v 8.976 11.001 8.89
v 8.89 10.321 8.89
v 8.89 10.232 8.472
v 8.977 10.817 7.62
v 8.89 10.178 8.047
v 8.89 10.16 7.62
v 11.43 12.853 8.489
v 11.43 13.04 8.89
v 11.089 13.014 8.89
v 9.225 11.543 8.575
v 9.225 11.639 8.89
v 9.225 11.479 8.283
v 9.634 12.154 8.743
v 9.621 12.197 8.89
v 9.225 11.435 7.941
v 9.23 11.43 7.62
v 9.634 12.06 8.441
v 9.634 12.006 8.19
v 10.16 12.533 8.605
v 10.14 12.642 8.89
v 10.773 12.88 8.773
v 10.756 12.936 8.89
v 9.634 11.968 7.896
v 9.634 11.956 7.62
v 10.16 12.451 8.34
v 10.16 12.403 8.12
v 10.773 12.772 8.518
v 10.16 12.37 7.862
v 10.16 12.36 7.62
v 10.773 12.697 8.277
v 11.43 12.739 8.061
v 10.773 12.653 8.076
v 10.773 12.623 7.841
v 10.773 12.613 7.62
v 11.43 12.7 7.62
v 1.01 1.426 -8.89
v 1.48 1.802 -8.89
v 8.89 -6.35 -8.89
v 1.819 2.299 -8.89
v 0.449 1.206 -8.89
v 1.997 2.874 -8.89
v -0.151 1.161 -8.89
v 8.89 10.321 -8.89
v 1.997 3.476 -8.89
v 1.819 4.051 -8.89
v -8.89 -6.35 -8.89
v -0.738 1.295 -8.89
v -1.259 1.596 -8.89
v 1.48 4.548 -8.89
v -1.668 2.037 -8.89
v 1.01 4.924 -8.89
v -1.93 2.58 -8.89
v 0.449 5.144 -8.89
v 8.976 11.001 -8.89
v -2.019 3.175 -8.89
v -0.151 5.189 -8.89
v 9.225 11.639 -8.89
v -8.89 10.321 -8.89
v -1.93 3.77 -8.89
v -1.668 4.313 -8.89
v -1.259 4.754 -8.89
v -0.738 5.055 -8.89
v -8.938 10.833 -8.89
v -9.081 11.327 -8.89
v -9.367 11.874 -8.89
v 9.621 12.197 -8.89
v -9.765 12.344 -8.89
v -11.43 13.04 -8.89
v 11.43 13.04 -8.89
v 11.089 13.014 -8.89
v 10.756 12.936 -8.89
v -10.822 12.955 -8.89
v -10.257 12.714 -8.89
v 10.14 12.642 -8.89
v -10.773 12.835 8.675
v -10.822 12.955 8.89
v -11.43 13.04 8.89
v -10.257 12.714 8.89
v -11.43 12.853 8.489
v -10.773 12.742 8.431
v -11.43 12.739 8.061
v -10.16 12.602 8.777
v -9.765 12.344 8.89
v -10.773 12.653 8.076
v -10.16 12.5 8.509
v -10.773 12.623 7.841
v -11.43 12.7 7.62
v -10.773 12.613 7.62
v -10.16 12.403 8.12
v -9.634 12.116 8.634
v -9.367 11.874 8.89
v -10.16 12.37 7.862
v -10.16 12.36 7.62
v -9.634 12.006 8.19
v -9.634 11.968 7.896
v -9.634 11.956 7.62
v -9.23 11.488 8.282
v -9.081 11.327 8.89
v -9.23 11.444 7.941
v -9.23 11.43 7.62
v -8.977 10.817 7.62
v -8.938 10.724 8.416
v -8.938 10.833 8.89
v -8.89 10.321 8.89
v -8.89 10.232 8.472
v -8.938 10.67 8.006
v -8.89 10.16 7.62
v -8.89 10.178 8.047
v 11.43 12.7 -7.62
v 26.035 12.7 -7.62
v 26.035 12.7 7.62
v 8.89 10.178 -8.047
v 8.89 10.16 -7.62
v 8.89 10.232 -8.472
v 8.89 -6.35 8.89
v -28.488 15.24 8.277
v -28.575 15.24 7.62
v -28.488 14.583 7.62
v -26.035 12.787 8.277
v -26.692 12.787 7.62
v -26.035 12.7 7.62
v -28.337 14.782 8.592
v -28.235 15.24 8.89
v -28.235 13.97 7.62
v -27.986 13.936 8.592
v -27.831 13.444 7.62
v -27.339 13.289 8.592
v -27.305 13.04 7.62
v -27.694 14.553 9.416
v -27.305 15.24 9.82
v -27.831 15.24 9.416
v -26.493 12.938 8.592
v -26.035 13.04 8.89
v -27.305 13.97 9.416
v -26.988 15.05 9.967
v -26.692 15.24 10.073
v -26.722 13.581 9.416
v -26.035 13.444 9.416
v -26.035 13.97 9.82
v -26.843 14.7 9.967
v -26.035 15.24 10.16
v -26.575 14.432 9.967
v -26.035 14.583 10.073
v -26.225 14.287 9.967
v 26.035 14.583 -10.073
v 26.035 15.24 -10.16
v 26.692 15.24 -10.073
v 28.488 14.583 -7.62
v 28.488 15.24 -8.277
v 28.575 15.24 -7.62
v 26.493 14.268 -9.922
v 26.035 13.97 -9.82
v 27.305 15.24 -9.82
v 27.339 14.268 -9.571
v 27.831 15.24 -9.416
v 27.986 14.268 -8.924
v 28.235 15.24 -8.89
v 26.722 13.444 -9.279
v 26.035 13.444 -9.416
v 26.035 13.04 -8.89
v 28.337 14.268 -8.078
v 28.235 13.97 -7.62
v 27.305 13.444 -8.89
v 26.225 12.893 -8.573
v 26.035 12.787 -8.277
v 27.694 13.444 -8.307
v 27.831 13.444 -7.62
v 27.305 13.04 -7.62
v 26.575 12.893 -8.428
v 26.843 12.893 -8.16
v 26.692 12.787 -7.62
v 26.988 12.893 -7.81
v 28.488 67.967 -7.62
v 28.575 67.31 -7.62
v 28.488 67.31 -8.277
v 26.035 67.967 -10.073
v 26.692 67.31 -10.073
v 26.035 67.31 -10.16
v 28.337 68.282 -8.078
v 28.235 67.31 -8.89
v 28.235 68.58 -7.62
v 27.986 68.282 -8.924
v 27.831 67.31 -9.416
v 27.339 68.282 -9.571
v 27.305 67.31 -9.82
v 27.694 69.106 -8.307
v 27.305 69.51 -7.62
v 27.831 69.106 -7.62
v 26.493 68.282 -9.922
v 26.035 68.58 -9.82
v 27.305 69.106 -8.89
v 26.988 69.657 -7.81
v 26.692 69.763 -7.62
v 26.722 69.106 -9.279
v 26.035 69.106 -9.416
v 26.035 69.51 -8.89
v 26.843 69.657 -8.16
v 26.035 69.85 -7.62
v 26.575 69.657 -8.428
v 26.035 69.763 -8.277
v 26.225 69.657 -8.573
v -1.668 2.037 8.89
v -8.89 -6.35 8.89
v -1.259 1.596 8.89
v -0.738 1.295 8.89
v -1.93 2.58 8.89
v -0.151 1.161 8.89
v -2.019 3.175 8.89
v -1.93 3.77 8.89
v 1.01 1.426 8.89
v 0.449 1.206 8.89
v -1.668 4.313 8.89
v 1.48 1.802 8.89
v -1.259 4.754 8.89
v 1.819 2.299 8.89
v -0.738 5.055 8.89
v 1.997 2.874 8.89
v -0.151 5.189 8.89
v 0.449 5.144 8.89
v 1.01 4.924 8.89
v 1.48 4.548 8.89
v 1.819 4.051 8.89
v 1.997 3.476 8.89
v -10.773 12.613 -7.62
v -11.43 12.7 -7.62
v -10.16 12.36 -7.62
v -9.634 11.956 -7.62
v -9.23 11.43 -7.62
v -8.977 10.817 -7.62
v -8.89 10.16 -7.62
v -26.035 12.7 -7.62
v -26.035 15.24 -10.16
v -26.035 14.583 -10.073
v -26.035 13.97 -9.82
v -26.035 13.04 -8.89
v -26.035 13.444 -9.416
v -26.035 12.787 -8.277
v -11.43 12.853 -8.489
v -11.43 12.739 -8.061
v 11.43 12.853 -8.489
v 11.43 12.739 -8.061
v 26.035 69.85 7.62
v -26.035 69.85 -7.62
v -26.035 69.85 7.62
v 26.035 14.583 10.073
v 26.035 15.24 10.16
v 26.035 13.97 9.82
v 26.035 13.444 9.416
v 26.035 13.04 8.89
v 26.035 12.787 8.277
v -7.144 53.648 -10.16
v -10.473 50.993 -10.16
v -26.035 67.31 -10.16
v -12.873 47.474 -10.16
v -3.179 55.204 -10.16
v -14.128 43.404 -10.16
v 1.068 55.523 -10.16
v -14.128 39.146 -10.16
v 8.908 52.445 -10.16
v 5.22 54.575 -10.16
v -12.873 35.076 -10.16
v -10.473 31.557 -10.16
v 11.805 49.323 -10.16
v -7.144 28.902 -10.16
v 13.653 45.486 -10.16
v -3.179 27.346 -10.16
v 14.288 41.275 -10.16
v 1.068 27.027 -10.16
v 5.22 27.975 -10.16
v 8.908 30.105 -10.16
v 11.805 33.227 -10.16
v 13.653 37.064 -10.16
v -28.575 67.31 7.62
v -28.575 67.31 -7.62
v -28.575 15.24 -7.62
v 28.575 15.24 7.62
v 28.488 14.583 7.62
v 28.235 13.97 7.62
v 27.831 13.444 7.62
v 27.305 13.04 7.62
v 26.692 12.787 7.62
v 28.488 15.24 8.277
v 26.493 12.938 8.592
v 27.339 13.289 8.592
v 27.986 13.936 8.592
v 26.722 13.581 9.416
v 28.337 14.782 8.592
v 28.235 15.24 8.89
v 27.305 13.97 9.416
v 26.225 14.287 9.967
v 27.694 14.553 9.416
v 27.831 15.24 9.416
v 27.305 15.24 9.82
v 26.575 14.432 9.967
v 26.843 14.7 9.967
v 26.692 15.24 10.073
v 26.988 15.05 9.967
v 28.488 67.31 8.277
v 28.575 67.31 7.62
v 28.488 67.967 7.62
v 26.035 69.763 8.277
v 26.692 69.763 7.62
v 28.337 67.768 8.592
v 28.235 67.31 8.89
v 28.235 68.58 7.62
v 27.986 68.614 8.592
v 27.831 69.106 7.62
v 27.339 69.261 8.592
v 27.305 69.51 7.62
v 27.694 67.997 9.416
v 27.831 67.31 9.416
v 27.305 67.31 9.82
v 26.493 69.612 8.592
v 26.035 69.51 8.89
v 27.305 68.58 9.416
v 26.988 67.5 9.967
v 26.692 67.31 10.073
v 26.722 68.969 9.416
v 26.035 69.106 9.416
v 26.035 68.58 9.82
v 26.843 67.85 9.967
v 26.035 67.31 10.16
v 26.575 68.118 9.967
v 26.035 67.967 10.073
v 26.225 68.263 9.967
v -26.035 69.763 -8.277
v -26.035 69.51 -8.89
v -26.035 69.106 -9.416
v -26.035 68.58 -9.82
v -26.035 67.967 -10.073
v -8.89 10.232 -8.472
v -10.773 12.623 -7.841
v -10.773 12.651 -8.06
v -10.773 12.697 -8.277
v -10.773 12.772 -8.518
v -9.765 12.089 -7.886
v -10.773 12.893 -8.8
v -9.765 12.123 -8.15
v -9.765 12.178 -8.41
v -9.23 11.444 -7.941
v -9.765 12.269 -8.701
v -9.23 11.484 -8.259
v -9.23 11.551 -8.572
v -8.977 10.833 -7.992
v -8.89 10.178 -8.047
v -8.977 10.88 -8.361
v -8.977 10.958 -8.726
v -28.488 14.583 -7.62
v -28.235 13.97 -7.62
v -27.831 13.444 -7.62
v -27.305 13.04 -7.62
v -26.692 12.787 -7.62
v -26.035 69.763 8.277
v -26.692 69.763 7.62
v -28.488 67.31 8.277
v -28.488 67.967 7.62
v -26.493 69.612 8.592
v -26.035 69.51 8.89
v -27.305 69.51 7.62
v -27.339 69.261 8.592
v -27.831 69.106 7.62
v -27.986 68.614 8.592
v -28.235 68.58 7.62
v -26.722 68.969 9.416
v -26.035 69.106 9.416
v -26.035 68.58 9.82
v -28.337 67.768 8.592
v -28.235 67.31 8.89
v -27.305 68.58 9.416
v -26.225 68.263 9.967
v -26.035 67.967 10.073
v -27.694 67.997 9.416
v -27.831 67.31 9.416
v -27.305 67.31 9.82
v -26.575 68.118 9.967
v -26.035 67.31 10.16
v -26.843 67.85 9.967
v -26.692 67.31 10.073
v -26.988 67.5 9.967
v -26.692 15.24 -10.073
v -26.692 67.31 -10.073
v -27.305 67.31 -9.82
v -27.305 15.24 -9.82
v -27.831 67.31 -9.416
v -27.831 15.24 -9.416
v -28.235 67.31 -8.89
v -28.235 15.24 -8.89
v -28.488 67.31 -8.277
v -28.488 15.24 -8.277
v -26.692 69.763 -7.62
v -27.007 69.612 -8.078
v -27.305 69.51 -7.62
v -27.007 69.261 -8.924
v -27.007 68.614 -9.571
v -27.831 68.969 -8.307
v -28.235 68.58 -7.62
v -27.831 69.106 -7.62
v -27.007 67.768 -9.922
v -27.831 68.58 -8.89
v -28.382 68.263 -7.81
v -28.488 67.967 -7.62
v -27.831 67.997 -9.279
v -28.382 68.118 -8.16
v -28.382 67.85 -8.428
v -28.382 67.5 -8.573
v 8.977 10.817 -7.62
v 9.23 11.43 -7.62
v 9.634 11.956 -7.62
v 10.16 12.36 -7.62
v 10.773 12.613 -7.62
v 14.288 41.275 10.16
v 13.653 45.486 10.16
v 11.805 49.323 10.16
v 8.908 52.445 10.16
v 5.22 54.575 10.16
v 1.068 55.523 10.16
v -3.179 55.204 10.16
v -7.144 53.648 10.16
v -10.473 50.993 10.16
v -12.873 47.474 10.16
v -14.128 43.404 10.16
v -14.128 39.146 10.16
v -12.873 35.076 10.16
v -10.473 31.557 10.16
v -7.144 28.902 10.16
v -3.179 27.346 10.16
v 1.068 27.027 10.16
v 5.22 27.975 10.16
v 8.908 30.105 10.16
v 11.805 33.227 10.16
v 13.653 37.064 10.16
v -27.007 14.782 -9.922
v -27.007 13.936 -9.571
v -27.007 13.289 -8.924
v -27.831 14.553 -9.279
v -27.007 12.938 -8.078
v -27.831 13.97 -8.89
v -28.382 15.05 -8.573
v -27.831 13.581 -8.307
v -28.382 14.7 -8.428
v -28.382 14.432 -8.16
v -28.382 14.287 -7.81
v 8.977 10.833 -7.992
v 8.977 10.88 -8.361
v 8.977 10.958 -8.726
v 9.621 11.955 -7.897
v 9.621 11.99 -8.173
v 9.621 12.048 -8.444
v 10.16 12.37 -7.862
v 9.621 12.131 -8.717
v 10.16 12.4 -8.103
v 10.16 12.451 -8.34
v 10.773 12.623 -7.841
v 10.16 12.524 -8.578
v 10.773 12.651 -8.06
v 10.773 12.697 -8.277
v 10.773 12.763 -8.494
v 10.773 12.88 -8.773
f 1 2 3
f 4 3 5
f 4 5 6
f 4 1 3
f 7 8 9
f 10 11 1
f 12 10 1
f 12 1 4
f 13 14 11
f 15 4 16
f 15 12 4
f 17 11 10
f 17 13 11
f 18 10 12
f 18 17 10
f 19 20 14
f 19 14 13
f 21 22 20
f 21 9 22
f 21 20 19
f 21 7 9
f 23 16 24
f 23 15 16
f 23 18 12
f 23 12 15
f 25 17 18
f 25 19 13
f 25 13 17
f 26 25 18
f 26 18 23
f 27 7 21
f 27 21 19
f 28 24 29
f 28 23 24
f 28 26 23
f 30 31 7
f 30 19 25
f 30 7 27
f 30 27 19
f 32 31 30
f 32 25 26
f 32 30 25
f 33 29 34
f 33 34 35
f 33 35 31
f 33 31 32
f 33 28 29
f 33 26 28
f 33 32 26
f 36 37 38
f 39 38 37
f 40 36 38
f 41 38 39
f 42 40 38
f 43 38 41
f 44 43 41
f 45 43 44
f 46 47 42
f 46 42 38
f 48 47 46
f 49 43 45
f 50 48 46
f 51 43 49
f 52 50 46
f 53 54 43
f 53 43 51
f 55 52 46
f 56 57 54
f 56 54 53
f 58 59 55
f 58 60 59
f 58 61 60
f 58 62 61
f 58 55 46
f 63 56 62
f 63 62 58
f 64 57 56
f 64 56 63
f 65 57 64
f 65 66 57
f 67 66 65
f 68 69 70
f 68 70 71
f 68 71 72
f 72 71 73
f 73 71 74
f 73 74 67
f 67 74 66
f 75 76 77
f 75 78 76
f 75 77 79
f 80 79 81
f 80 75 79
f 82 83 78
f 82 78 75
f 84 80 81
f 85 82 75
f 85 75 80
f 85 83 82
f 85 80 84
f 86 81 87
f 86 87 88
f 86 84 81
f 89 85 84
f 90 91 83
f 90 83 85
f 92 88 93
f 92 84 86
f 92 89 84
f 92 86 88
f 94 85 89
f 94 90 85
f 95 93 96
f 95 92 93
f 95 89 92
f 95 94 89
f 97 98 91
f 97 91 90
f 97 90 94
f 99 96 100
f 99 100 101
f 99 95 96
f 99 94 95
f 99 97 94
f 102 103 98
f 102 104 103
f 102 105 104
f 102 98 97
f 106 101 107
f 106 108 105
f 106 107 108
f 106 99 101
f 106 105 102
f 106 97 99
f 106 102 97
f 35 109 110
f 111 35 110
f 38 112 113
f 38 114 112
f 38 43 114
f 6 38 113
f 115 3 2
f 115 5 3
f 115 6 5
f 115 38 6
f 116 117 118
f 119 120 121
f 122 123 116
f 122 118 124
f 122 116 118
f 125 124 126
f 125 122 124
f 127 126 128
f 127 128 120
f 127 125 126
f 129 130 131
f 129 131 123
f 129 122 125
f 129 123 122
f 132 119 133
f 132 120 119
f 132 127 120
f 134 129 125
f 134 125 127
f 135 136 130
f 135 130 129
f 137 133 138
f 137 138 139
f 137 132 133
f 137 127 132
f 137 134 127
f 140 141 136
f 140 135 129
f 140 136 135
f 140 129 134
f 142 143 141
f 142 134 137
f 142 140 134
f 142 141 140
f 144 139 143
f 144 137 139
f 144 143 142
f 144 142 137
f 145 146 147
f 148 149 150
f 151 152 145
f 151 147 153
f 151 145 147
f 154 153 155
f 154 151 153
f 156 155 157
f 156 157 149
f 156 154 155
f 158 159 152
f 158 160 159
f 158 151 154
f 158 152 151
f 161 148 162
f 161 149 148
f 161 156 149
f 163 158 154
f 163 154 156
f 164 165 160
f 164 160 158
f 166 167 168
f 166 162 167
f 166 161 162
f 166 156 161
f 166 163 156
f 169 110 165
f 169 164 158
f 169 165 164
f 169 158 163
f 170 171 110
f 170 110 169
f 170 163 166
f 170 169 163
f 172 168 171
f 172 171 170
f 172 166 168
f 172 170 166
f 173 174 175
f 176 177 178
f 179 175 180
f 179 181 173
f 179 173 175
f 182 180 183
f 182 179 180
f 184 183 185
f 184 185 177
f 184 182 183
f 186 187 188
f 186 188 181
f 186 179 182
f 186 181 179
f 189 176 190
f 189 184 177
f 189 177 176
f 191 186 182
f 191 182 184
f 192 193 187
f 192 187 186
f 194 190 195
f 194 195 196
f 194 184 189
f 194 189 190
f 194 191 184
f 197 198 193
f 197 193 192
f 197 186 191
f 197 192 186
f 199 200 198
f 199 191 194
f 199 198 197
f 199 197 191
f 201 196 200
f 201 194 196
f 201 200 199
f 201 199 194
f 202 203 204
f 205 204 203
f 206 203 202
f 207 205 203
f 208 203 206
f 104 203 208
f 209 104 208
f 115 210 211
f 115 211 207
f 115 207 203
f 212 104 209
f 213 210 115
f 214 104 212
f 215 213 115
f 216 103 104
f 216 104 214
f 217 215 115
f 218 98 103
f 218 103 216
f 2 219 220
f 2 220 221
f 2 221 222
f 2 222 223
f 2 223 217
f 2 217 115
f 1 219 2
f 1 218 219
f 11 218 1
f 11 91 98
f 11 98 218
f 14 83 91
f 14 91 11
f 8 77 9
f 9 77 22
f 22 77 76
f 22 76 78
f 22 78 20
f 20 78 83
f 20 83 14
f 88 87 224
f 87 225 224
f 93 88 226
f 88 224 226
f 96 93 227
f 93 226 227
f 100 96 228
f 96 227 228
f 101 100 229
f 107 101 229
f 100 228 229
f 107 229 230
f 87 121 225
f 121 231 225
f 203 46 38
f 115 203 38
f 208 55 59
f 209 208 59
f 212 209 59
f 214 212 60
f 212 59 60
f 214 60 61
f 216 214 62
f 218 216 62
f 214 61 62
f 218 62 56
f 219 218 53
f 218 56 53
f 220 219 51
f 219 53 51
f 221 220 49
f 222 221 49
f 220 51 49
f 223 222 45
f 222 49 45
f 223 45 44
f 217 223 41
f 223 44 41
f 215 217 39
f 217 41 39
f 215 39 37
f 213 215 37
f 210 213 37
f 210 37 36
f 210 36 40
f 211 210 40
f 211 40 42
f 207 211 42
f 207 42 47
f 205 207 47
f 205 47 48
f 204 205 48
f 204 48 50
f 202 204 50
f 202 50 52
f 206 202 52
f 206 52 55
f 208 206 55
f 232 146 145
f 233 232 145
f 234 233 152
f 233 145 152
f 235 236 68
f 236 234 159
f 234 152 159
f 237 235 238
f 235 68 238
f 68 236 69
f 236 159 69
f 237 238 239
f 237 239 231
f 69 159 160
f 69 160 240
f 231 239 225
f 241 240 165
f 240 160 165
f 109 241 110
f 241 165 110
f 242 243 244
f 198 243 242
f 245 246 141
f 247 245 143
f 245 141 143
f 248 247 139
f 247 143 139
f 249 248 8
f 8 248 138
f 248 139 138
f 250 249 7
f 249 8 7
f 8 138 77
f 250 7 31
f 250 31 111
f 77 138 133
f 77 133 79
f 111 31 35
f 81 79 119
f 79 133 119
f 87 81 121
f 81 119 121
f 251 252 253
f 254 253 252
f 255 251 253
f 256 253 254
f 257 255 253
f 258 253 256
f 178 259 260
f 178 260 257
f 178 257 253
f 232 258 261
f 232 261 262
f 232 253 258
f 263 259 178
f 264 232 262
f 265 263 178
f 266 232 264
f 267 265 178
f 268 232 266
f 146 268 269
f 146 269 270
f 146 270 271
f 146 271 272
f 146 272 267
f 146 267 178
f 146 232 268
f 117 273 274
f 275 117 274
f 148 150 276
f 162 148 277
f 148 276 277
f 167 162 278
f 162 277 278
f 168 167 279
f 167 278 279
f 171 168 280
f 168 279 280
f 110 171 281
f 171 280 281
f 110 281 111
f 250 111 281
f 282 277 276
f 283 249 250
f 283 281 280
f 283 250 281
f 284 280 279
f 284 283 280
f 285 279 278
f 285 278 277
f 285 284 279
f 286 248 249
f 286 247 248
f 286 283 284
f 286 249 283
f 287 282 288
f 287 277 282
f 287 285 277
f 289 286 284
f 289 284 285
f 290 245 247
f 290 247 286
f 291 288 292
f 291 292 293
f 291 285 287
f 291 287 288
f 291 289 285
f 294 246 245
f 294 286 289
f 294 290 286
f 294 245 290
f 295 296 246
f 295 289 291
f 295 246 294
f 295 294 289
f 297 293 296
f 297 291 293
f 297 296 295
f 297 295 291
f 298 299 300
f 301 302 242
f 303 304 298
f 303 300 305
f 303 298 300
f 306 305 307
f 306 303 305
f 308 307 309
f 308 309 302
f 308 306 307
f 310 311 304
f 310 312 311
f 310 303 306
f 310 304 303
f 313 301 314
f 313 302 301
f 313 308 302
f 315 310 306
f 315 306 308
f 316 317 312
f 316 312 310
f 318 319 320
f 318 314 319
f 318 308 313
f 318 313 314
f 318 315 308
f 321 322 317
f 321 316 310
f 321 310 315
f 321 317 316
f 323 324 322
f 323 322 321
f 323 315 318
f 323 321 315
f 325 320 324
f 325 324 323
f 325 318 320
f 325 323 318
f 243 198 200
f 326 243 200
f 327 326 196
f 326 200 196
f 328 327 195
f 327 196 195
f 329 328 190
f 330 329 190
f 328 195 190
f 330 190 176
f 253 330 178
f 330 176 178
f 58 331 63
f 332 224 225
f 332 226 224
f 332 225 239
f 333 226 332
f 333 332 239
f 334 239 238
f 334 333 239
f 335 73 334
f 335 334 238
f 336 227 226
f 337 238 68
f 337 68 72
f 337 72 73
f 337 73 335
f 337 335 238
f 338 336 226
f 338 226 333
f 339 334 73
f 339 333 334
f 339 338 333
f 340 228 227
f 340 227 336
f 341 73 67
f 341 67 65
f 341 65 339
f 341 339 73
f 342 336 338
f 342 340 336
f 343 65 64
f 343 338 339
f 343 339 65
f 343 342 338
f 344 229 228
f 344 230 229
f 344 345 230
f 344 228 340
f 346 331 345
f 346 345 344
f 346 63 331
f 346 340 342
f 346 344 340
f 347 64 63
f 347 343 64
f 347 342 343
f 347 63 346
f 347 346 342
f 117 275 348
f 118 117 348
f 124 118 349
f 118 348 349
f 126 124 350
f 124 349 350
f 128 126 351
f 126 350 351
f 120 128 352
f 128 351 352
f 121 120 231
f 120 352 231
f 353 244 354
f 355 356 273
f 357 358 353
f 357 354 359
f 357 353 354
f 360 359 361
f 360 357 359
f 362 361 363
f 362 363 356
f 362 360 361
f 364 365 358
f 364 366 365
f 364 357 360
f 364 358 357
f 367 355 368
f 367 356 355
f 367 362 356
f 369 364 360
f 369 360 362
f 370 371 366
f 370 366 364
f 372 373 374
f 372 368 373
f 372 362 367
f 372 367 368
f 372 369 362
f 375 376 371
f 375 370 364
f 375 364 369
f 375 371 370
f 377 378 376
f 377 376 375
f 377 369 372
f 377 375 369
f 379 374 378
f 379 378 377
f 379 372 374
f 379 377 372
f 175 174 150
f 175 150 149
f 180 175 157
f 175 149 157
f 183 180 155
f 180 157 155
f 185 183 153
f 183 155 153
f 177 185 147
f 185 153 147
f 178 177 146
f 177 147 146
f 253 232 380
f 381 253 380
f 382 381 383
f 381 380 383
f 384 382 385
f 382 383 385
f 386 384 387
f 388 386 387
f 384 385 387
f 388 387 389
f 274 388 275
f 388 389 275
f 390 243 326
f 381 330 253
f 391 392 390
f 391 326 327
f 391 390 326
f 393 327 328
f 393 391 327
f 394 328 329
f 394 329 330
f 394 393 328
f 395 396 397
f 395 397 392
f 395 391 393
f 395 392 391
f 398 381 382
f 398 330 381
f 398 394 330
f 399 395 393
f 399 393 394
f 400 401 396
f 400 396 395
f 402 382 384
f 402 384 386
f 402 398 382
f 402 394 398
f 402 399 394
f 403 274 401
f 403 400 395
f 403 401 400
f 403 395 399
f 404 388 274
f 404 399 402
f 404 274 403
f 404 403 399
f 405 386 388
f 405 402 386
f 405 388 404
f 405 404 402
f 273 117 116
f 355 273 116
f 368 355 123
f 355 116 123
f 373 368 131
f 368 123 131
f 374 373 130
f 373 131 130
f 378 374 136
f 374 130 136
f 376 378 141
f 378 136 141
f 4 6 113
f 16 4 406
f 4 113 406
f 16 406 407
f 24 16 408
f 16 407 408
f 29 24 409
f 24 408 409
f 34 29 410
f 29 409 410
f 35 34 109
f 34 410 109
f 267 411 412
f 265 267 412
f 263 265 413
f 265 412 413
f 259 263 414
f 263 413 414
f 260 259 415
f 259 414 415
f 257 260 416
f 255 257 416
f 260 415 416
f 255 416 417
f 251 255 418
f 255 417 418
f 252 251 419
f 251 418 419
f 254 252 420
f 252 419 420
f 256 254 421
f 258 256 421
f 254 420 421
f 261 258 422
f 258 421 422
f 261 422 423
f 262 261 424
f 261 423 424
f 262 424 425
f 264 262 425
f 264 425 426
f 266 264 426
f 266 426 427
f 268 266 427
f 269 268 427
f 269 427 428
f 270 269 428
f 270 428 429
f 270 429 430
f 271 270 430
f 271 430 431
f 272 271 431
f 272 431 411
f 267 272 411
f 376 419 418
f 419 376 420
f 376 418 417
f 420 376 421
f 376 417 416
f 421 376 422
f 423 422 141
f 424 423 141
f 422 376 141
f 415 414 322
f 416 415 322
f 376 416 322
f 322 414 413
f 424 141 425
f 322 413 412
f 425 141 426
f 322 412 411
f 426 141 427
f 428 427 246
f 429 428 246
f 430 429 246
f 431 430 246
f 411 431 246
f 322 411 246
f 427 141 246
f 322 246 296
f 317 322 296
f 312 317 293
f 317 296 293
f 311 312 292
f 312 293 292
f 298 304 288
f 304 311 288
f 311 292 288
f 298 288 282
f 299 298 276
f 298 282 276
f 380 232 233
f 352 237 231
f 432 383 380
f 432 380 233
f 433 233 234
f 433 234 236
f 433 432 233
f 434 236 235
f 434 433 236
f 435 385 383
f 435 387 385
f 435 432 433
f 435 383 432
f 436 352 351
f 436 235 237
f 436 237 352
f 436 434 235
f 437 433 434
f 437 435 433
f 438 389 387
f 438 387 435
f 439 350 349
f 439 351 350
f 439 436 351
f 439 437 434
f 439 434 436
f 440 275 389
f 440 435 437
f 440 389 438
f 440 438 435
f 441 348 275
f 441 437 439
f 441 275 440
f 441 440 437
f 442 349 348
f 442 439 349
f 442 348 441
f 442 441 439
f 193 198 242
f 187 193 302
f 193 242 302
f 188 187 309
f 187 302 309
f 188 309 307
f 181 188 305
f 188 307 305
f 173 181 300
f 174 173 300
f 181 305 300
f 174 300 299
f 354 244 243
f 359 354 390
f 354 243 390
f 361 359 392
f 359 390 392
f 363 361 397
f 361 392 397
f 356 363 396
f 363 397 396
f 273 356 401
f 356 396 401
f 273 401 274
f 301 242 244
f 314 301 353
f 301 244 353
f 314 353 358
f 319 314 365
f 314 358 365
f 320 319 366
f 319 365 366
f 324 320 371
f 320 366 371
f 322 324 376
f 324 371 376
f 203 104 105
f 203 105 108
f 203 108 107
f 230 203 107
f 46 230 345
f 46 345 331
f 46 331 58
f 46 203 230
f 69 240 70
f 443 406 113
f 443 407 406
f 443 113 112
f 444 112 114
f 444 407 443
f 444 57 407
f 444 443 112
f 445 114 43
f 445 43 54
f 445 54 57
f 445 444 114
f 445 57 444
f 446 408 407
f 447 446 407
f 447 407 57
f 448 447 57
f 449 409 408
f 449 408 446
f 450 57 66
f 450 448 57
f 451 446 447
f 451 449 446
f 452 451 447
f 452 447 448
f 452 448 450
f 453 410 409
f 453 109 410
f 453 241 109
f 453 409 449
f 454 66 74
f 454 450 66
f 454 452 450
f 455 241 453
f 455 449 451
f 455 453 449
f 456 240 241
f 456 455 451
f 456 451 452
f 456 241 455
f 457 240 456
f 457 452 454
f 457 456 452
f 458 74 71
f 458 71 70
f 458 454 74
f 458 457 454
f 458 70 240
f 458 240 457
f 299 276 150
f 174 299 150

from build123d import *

# Parameters (mm, degrees)
BOSS_EXTRUDE1_DEPTH      = 12.7
BOSS_EXTRUDE1_DEPTH_BACK = 6.35
SKETCH1_W                = 17.78
SKETCH1_H                = 17.78
SKETCH2_W                = 57.15
SKETCH2_H                = 20.32
BOSS_EXTRUDE2_DEPTH      = 57.15
SKETCH3_R                = 14.2875
CUT_EXTRUDE1_DEPTH       = 79.156608966
FILLET1_R                = 2.54
SKETCH4_R                = 2.0193
CUT_EXTRUDE2_DEPTH       = 78.836081768
FILLET2_R                = 2.54


with BuildPart() as part:
    # Sketch1 → Boss-Extrude1 (new, two sides: drawn at the far end of the back side and taken through both)
    with BuildSketch(Plane(origin=(0, 0, 0), x_dir=(1, 0, 0), z_dir=(0, 1, 0)).offset(-BOSS_EXTRUDE1_DEPTH_BACK)):
        Rectangle(SKETCH1_W, SKETCH1_H)
    extrude(amount=BOSS_EXTRUDE1_DEPTH + BOSS_EXTRUDE1_DEPTH_BACK)

    # Sketch2 → Boss-Extrude2 (add)
    with BuildSketch(Plane(origin=(0, 12.7, 0), x_dir=(1, 0, 0), z_dir=(0, 1, 0))):
        Rectangle(SKETCH2_W, SKETCH2_H)
    extrude(amount=BOSS_EXTRUDE2_DEPTH)

    # Sketch3 → Cut-Extrude1 (cut, through all)
    with BuildSketch(Plane.XY.offset(10.16)):
        with Locations((0, 41.275)):
            Circle(SKETCH3_R)
    extrude(amount=-CUT_EXTRUDE1_DEPTH, mode=Mode.SUBTRACT)

    # Fillet1
    # the kernel refuses this fillet: 2.54 mm, written as the material it takes off along each edge
    with BuildSketch(Plane(origin=(26.035, 67.31, 7.62), x_dir=(0, 1, 0), z_dir=(0, 0, 1))) as fillet1_piece_1_section:
        Polygon((0, 0), (FILLET1_R, 0), (FILLET1_R, -FILLET1_R), (0, -FILLET1_R), align=None)
    fillet1_piece_1 = extrude(amount=FILLET1_R, mode=Mode.PRIVATE)
    fillet1_piece_1 = fillet1_piece_1 - Plane(origin=(26.035, 67.31, 7.62), x_dir=(-0.7071067811865475, -0.7071067811865475, 0), z_dir=(0, 0, 1)) * Sphere(FILLET1_R, mode=Mode.PRIVATE)
    add(fillet1_piece_1, mode=Mode.SUBTRACT)
    with BuildSketch(Plane(origin=(26.035, 67.31, -7.62), x_dir=(1, 0, 0), z_dir=(0, 1, 0))) as fillet1_piece_2_section:
        Polygon((0, 0), (FILLET1_R, 0), (FILLET1_R, FILLET1_R), (0, FILLET1_R), align=None)
    fillet1_piece_2 = extrude(amount=FILLET1_R, mode=Mode.PRIVATE)
    fillet1_piece_2 = fillet1_piece_2 - Plane(origin=(26.035, 67.31, -7.62), x_dir=(-0.7071067811865475, 0, 0.7071067811865475), z_dir=(0, 1, 0)) * Sphere(FILLET1_R, mode=Mode.PRIVATE)
    add(fillet1_piece_2, mode=Mode.SUBTRACT)
    with BuildSketch(Plane(origin=(26.035, 15.24, 7.62), x_dir=(0, -1, 0), z_dir=(0, 0, 1))) as fillet1_piece_3_section:
        Polygon((0, 0), (FILLET1_R, 0), (FILLET1_R, FILLET1_R), (0, FILLET1_R), align=None)
    fillet1_piece_3 = extrude(amount=FILLET1_R, mode=Mode.PRIVATE)
    fillet1_piece_3 = fillet1_piece_3 - Plane(origin=(26.035, 15.24, 7.62), x_dir=(-0.7071067811865475, 0.7071067811865475, 0), z_dir=(0, 0, 1)) * Sphere(FILLET1_R, mode=Mode.PRIVATE)
    add(fillet1_piece_3, mode=Mode.SUBTRACT)
    with BuildSketch(Plane(origin=(26.035, 15.24, -7.62), x_dir=(1, 0, 0), z_dir=(0, -1, 0))) as fillet1_piece_4_section:
        Polygon((0, 0), (FILLET1_R, 0), (FILLET1_R, -FILLET1_R), (0, -FILLET1_R), align=None)
    fillet1_piece_4 = extrude(amount=FILLET1_R, mode=Mode.PRIVATE)
    fillet1_piece_4 = fillet1_piece_4 - Plane(origin=(26.035, 15.24, -7.62), x_dir=(-0.7071067811865475, 0, 0.7071067811865475), z_dir=(0, -1, 0)) * Sphere(FILLET1_R, mode=Mode.PRIVATE)
    add(fillet1_piece_4, mode=Mode.SUBTRACT)
    with BuildSketch(Plane(origin=(-26.035, 67.31, -7.62), x_dir=(0, 1, 0), z_dir=(-1, 0, 0))) as fillet1_piece_5_section:
        Polygon((0, 0), (FILLET1_R, 0), (FILLET1_R, FILLET1_R), (0, FILLET1_R), align=None)
    fillet1_piece_5 = extrude(amount=FILLET1_R, mode=Mode.PRIVATE)
    fillet1_piece_5 = fillet1_piece_5 - Plane(origin=(-26.035, 67.31, -7.62), x_dir=(0, -0.7071067811865475, 0.7071067811865475), z_dir=(-1, 0, 0)) * Sphere(FILLET1_R, mode=Mode.PRIVATE)
    add(fillet1_piece_5, mode=Mode.SUBTRACT)
    with BuildSketch(Plane(origin=(-26.035, 67.31, 7.62), x_dir=(-1, 0, 0), z_dir=(0, 0, 1))) as fillet1_piece_6_section:
        Polygon((0, 0), (FILLET1_R, 0), (FILLET1_R, -FILLET1_R), (0, -FILLET1_R), align=None)
    fillet1_piece_6 = extrude(amount=FILLET1_R, mode=Mode.PRIVATE)
    fillet1_piece_6 = fillet1_piece_6 - Plane(origin=(-26.035, 67.31, 7.62), x_dir=(0.7071067811865475, -0.7071067811865475, 0), z_dir=(0, 0, 1)) * Sphere(FILLET1_R, mode=Mode.PRIVATE)
    add(fillet1_piece_6, mode=Mode.SUBTRACT)
    with BuildSketch(Plane(origin=(-26.035, 15.24, -7.62), x_dir=(0, -1, 0), z_dir=(-1, 0, 0))) as fillet1_piece_7_section:
        Polygon((0, 0), (FILLET1_R, 0), (FILLET1_R, -FILLET1_R), (0, -FILLET1_R), align=None)
    fillet1_piece_7 = extrude(amount=FILLET1_R, mode=Mode.PRIVATE)
    fillet1_piece_7 = fillet1_piece_7 - Plane(origin=(-26.035, 15.24, -7.62), x_dir=(0, 0.7071067811865475, 0.7071067811865475), z_dir=(-1, 0, 0)) * Sphere(FILLET1_R, mode=Mode.PRIVATE)
    add(fillet1_piece_7, mode=Mode.SUBTRACT)
    with BuildSketch(Plane(origin=(-26.035, 15.24, 7.62), x_dir=(-1, 0, 0), z_dir=(0, 0, 1))) as fillet1_piece_8_section:
        Polygon((0, 0), (FILLET1_R, 0), (FILLET1_R, FILLET1_R), (0, FILLET1_R), align=None)
    fillet1_piece_8 = extrude(amount=FILLET1_R, mode=Mode.PRIVATE)
    fillet1_piece_8 = fillet1_piece_8 - Plane(origin=(-26.035, 15.24, 7.62), x_dir=(0.7071067811865475, 0.7071067811865475, 0), z_dir=(0, 0, 1)) * Sphere(FILLET1_R, mode=Mode.PRIVATE)
    add(fillet1_piece_8, mode=Mode.SUBTRACT)
    with BuildSketch(Plane(origin=(28.575, 69.85, 7.62), x_dir=(-1, 0, 0), z_dir=(0, 0, -1)), Plane(origin=(-28.575, 12.7, -7.62), x_dir=(0, 1, 0), z_dir=(0, 0, 1))) as fillet1_piece_9:
        with BuildLine():
            CenterArc((FILLET1_R, -FILLET1_R), FILLET1_R, 90, 90)
            Line((0, -FILLET1_R), (0, 0))
            Line((0, 0), (FILLET1_R, 0))
        make_face()
    extrude(amount=15.24, mode=Mode.SUBTRACT)
    with BuildSketch(Plane(origin=(28.575, 12.7, 7.62), x_dir=(-1, 0, 0), z_dir=(0, 0, -1)), Plane(origin=(-28.575, 69.85, -7.62), x_dir=(0, -1, 0), z_dir=(0, 0, 1))) as fillet1_piece_10:
        with BuildLine():
            CenterArc((FILLET1_R, FILLET1_R), FILLET1_R, 180, 90)
            Line((0, FILLET1_R), (0, 0))
            Line((0, 0), (FILLET1_R, 0))
        make_face()
    extrude(amount=15.24, mode=Mode.SUBTRACT)
    with BuildSketch(Plane(origin=(28.575, 15.24, -10.16), x_dir=(0, 0, 1), z_dir=(0, 1, 0)), Plane(origin=(26.035, 69.85, -10.16), x_dir=(0, 0, 1), z_dir=(-1, 0, 0)), Plane(origin=(28.575, 15.24, 10.16), x_dir=(-1, 0, 0), z_dir=(0, 1, 0))) as fillet1_piece_11:
        with BuildLine():
            CenterArc((FILLET1_R, -FILLET1_R), FILLET1_R, 90, 90)
            Line((0, -FILLET1_R), (0, 0))
            Line((0, 0), (FILLET1_R, 0))
        make_face()
    extrude(amount=52.07, mode=Mode.SUBTRACT)
    with BuildSketch(Plane(origin=(-28.575, 15.24, -10.16), x_dir=(0, 0, 1), z_dir=(0, 1, 0)), Plane(origin=(-28.575, 15.24, 10.16), x_dir=(1, 0, 0), z_dir=(0, 1, 0)), Plane(origin=(-26.035, 69.85, 10.16), x_dir=(0, -1, 0), z_dir=(1, 0, 0))) as fillet1_piece_12:
        with BuildLine():
            CenterArc((FILLET1_R, FILLET1_R), FILLET1_R, 180, 90)
            Line((0, FILLET1_R), (0, 0))
            Line((0, 0), (FILLET1_R, 0))
        make_face()
    extrude(amount=52.07, mode=Mode.SUBTRACT)
    with BuildSketch(Plane(origin=(26.035, 12.7, -10.16), x_dir=(0, 0, 1), z_dir=(-1, 0, 0))) as fillet1_piece_13_section:
        with BuildLine():
            CenterArc((FILLET1_R, FILLET1_R), FILLET1_R, 180, 90)
            Line((0, FILLET1_R), (0, 0))
            Line((0, 0), (FILLET1_R, 0))
        make_face()
    fillet1_piece_13 = extrude(amount=52.07, mode=Mode.PRIVATE)
    fillet1_piece_13 = split(fillet1_piece_13, bisect_by=Plane(origin=(8.89, 12.760981289, -8.475343007), z_dir=(1, 0, 0)), keep=Keep.TOP, mode=Mode.PRIVATE)
    fillet1_piece_13 = split(fillet1_piece_13, bisect_by=Plane(origin=(17.4625, 12.760981289, -8.89), z_dir=(0, 0, 1)), keep=Keep.TOP, mode=Mode.PRIVATE)
    add(fillet1_piece_13, mode=Mode.SUBTRACT)
    with BuildSketch(Plane(origin=(26.035, 12.7, -10.16), x_dir=(0, 0, 1), z_dir=(-1, 0, 0))) as fillet1_piece_14_section:
        with BuildLine():
            CenterArc((FILLET1_R, FILLET1_R), FILLET1_R, 180, 90)
            Line((0, FILLET1_R), (0, 0))
            Line((0, 0), (FILLET1_R, 0))
        make_face()
    fillet1_piece_14 = extrude(amount=52.07, mode=Mode.PRIVATE)
    fillet1_piece_14 = split(fillet1_piece_14, bisect_by=Plane(origin=(8.89, 13.348004952, -9.742444919), z_dir=(1, 0, 0)), keep=Keep.TOP, mode=Mode.PRIVATE)
    fillet1_piece_14 = split(fillet1_piece_14, bisect_by=Plane(origin=(17.4625, 13.348004952, -8.89), z_dir=(0, 0, -1)), keep=Keep.TOP, mode=Mode.PRIVATE)
    add(fillet1_piece_14, mode=Mode.SUBTRACT)
    with BuildSketch(Plane(origin=(26.035, 12.7, -10.16), x_dir=(0, 0, 1), z_dir=(-1, 0, 0))) as fillet1_piece_15_section:
        with BuildLine():
            CenterArc((FILLET1_R, FILLET1_R), FILLET1_R, 180, 90)
            Line((0, FILLET1_R), (0, 0))
            Line((0, 0), (FILLET1_R, 0))
        make_face()
    fillet1_piece_15 = extrude(amount=52.07, mode=Mode.PRIVATE)
    fillet1_piece_15 = split(fillet1_piece_15, bisect_by=Plane(origin=(8.89, 13.348004952, -9.742444919), z_dir=(-1, 0, 0)), keep=Keep.TOP, mode=Mode.PRIVATE)
    fillet1_piece_15 = split(fillet1_piece_15, bisect_by=Plane(origin=(0, 13.348004952, -8.89), z_dir=(0, 0, -1)), keep=Keep.TOP, mode=Mode.PRIVATE)
    fillet1_piece_15 = split(fillet1_piece_15, bisect_by=Plane(origin=(-8.89, 13.348004952, -9.742444919), z_dir=(1, 0, 0)), keep=Keep.TOP, mode=Mode.PRIVATE)
    add(fillet1_piece_15, mode=Mode.SUBTRACT)
    with BuildSketch(Plane(origin=(26.035, 12.7, -10.16), x_dir=(0, 0, 1), z_dir=(-1, 0, 0))) as fillet1_piece_16_section:
        with BuildLine():
            CenterArc((FILLET1_R, FILLET1_R), FILLET1_R, 180, 90)
            Line((0, FILLET1_R), (0, 0))
            Line((0, 0), (FILLET1_R, 0))
        make_face()
    fillet1_piece_16 = extrude(amount=52.07, mode=Mode.PRIVATE)
    fillet1_piece_16 = split(fillet1_piece_16, bisect_by=Plane(origin=(-17.4625, 12.760981289, -8.89), z_dir=(0, 0, 1)), keep=Keep.TOP, mode=Mode.PRIVATE)
    fillet1_piece_16 = split(fillet1_piece_16, bisect_by=Plane(origin=(-8.89, 12.760981289, -8.475343007), z_dir=(-1, 0, 0)), keep=Keep.TOP, mode=Mode.PRIVATE)
    add(fillet1_piece_16, mode=Mode.SUBTRACT)
    with BuildSketch(Plane(origin=(26.035, 12.7, -10.16), x_dir=(0, 0, 1), z_dir=(-1, 0, 0))) as fillet1_piece_17_section:
        with BuildLine():
            CenterArc((FILLET1_R, FILLET1_R), FILLET1_R, 180, 90)
            Line((0, FILLET1_R), (0, 0))
            Line((0, 0), (FILLET1_R, 0))
        make_face()
    fillet1_piece_17 = extrude(amount=52.07, mode=Mode.PRIVATE)
    fillet1_piece_17 = split(fillet1_piece_17, bisect_by=Plane(origin=(-17.4625, 13.348004952, -8.89), z_dir=(0, 0, -1)), keep=Keep.TOP, mode=Mode.PRIVATE)
    fillet1_piece_17 = split(fillet1_piece_17, bisect_by=Plane(origin=(-8.89, 13.348004952, -9.742444919), z_dir=(-1, 0, 0)), keep=Keep.TOP, mode=Mode.PRIVATE)
    add(fillet1_piece_17, mode=Mode.SUBTRACT)
    with BuildSketch(Plane(origin=(-26.035, 12.7, 10.16), x_dir=(0, 1, 0), z_dir=(1, 0, 0))) as fillet1_piece_18_section:
        with BuildLine():
            CenterArc((FILLET1_R, -FILLET1_R), FILLET1_R, 90, 90)
            Line((0, -FILLET1_R), (0, 0))
            Line((0, 0), (FILLET1_R, 0))
        make_face()
    fillet1_piece_18 = extrude(amount=52.07, mode=Mode.PRIVATE)
    fillet1_piece_18 = split(fillet1_piece_18, bisect_by=Plane(origin=(-17.4625, 13.348004952, 8.89), z_dir=(0, 0, 1)), keep=Keep.TOP, mode=Mode.PRIVATE)
    fillet1_piece_18 = split(fillet1_piece_18, bisect_by=Plane(origin=(-8.89, 13.348004952, 9.742444919), z_dir=(-1, 0, 0)), keep=Keep.TOP, mode=Mode.PRIVATE)
    add(fillet1_piece_18, mode=Mode.SUBTRACT)
    with BuildSketch(Plane(origin=(-26.035, 12.7, 10.16), x_dir=(0, 1, 0), z_dir=(1, 0, 0))) as fillet1_piece_19_section:
        with BuildLine():
            CenterArc((FILLET1_R, -FILLET1_R), FILLET1_R, 90, 90)
            Line((0, -FILLET1_R), (0, 0))
            Line((0, 0), (FILLET1_R, 0))
        make_face()
    fillet1_piece_19 = extrude(amount=52.07, mode=Mode.PRIVATE)
    fillet1_piece_19 = split(fillet1_piece_19, bisect_by=Plane(origin=(-17.4625, 12.760981289, 8.89), z_dir=(0, 0, -1)), keep=Keep.TOP, mode=Mode.PRIVATE)
    fillet1_piece_19 = split(fillet1_piece_19, bisect_by=Plane(origin=(-8.89, 12.760981289, 8.475343007), z_dir=(-1, 0, 0)), keep=Keep.TOP, mode=Mode.PRIVATE)
    add(fillet1_piece_19, mode=Mode.SUBTRACT)
    with BuildSketch(Plane(origin=(-26.035, 12.7, 10.16), x_dir=(0, 1, 0), z_dir=(1, 0, 0))) as fillet1_piece_20_section:
        with BuildLine():
            CenterArc((FILLET1_R, -FILLET1_R), FILLET1_R, 90, 90)
            Line((0, -FILLET1_R), (0, 0))
            Line((0, 0), (FILLET1_R, 0))
        make_face()
    fillet1_piece_20 = extrude(amount=52.07, mode=Mode.PRIVATE)
    fillet1_piece_20 = split(fillet1_piece_20, bisect_by=Plane(origin=(0, 13.348004952, 8.89), z_dir=(0, 0, 1)), keep=Keep.TOP, mode=Mode.PRIVATE)
    fillet1_piece_20 = split(fillet1_piece_20, bisect_by=Plane(origin=(8.89, 13.348004952, 9.742444919), z_dir=(-1, 0, 0)), keep=Keep.TOP, mode=Mode.PRIVATE)
    fillet1_piece_20 = split(fillet1_piece_20, bisect_by=Plane(origin=(-8.89, 13.348004952, 9.742444919), z_dir=(1, 0, 0)), keep=Keep.TOP, mode=Mode.PRIVATE)
    add(fillet1_piece_20, mode=Mode.SUBTRACT)
    with BuildSketch(Plane(origin=(-26.035, 12.7, 10.16), x_dir=(0, 1, 0), z_dir=(1, 0, 0))) as fillet1_piece_21_section:
        with BuildLine():
            CenterArc((FILLET1_R, -FILLET1_R), FILLET1_R, 90, 90)
            Line((0, -FILLET1_R), (0, 0))
            Line((0, 0), (FILLET1_R, 0))
        make_face()
    fillet1_piece_21 = extrude(amount=52.07, mode=Mode.PRIVATE)
    fillet1_piece_21 = split(fillet1_piece_21, bisect_by=Plane(origin=(17.4625, 13.348004952, 8.89), z_dir=(0, 0, 1)), keep=Keep.TOP, mode=Mode.PRIVATE)
    fillet1_piece_21 = split(fillet1_piece_21, bisect_by=Plane(origin=(8.89, 13.348004952, 9.742444919), z_dir=(1, 0, 0)), keep=Keep.TOP, mode=Mode.PRIVATE)
    add(fillet1_piece_21, mode=Mode.SUBTRACT)
    with BuildSketch(Plane(origin=(-26.035, 12.7, 10.16), x_dir=(0, 1, 0), z_dir=(1, 0, 0))) as fillet1_piece_22_section:
        with BuildLine():
            CenterArc((FILLET1_R, -FILLET1_R), FILLET1_R, 90, 90)
            Line((0, -FILLET1_R), (0, 0))
            Line((0, 0), (FILLET1_R, 0))
        make_face()
    fillet1_piece_22 = extrude(amount=52.07, mode=Mode.PRIVATE)
    fillet1_piece_22 = split(fillet1_piece_22, bisect_by=Plane(origin=(17.4625, 12.760981289, 8.89), z_dir=(0, 0, -1)), keep=Keep.TOP, mode=Mode.PRIVATE)
    fillet1_piece_22 = split(fillet1_piece_22, bisect_by=Plane(origin=(8.89, 12.760981289, 8.475343007), z_dir=(1, 0, 0)), keep=Keep.TOP, mode=Mode.PRIVATE)
    add(fillet1_piece_22, mode=Mode.SUBTRACT)

    # Sketch4 → Cut-Extrude2 (cut, through all)
    with BuildSketch(Plane(origin=(0, 0, -8.89), x_dir=(-1, 0, 0), z_dir=(0, 0, -1))):
        with Locations((0, 3.175)):
            Circle(SKETCH4_R)
    extrude(amount=-CUT_EXTRUDE2_DEPTH, mode=Mode.SUBTRACT)

    # Fillet2
    fillet2_edges = [part.edges().sort_by_distance(p)[0] for p in [
        (8.89, 12.7, 0),
        (-8.89, 12.7, 0),
        (-8.89, 12.786548401, -8.277400375),
        (8.89, 12.786548401, -8.277400375),
        (8.89, 12.786548401, 8.277400375),
        (-8.89, 12.786548401, 8.277400375),
    ]]
    fillet(fillet2_edges, radius=FILLET2_R)


solid = part.part
